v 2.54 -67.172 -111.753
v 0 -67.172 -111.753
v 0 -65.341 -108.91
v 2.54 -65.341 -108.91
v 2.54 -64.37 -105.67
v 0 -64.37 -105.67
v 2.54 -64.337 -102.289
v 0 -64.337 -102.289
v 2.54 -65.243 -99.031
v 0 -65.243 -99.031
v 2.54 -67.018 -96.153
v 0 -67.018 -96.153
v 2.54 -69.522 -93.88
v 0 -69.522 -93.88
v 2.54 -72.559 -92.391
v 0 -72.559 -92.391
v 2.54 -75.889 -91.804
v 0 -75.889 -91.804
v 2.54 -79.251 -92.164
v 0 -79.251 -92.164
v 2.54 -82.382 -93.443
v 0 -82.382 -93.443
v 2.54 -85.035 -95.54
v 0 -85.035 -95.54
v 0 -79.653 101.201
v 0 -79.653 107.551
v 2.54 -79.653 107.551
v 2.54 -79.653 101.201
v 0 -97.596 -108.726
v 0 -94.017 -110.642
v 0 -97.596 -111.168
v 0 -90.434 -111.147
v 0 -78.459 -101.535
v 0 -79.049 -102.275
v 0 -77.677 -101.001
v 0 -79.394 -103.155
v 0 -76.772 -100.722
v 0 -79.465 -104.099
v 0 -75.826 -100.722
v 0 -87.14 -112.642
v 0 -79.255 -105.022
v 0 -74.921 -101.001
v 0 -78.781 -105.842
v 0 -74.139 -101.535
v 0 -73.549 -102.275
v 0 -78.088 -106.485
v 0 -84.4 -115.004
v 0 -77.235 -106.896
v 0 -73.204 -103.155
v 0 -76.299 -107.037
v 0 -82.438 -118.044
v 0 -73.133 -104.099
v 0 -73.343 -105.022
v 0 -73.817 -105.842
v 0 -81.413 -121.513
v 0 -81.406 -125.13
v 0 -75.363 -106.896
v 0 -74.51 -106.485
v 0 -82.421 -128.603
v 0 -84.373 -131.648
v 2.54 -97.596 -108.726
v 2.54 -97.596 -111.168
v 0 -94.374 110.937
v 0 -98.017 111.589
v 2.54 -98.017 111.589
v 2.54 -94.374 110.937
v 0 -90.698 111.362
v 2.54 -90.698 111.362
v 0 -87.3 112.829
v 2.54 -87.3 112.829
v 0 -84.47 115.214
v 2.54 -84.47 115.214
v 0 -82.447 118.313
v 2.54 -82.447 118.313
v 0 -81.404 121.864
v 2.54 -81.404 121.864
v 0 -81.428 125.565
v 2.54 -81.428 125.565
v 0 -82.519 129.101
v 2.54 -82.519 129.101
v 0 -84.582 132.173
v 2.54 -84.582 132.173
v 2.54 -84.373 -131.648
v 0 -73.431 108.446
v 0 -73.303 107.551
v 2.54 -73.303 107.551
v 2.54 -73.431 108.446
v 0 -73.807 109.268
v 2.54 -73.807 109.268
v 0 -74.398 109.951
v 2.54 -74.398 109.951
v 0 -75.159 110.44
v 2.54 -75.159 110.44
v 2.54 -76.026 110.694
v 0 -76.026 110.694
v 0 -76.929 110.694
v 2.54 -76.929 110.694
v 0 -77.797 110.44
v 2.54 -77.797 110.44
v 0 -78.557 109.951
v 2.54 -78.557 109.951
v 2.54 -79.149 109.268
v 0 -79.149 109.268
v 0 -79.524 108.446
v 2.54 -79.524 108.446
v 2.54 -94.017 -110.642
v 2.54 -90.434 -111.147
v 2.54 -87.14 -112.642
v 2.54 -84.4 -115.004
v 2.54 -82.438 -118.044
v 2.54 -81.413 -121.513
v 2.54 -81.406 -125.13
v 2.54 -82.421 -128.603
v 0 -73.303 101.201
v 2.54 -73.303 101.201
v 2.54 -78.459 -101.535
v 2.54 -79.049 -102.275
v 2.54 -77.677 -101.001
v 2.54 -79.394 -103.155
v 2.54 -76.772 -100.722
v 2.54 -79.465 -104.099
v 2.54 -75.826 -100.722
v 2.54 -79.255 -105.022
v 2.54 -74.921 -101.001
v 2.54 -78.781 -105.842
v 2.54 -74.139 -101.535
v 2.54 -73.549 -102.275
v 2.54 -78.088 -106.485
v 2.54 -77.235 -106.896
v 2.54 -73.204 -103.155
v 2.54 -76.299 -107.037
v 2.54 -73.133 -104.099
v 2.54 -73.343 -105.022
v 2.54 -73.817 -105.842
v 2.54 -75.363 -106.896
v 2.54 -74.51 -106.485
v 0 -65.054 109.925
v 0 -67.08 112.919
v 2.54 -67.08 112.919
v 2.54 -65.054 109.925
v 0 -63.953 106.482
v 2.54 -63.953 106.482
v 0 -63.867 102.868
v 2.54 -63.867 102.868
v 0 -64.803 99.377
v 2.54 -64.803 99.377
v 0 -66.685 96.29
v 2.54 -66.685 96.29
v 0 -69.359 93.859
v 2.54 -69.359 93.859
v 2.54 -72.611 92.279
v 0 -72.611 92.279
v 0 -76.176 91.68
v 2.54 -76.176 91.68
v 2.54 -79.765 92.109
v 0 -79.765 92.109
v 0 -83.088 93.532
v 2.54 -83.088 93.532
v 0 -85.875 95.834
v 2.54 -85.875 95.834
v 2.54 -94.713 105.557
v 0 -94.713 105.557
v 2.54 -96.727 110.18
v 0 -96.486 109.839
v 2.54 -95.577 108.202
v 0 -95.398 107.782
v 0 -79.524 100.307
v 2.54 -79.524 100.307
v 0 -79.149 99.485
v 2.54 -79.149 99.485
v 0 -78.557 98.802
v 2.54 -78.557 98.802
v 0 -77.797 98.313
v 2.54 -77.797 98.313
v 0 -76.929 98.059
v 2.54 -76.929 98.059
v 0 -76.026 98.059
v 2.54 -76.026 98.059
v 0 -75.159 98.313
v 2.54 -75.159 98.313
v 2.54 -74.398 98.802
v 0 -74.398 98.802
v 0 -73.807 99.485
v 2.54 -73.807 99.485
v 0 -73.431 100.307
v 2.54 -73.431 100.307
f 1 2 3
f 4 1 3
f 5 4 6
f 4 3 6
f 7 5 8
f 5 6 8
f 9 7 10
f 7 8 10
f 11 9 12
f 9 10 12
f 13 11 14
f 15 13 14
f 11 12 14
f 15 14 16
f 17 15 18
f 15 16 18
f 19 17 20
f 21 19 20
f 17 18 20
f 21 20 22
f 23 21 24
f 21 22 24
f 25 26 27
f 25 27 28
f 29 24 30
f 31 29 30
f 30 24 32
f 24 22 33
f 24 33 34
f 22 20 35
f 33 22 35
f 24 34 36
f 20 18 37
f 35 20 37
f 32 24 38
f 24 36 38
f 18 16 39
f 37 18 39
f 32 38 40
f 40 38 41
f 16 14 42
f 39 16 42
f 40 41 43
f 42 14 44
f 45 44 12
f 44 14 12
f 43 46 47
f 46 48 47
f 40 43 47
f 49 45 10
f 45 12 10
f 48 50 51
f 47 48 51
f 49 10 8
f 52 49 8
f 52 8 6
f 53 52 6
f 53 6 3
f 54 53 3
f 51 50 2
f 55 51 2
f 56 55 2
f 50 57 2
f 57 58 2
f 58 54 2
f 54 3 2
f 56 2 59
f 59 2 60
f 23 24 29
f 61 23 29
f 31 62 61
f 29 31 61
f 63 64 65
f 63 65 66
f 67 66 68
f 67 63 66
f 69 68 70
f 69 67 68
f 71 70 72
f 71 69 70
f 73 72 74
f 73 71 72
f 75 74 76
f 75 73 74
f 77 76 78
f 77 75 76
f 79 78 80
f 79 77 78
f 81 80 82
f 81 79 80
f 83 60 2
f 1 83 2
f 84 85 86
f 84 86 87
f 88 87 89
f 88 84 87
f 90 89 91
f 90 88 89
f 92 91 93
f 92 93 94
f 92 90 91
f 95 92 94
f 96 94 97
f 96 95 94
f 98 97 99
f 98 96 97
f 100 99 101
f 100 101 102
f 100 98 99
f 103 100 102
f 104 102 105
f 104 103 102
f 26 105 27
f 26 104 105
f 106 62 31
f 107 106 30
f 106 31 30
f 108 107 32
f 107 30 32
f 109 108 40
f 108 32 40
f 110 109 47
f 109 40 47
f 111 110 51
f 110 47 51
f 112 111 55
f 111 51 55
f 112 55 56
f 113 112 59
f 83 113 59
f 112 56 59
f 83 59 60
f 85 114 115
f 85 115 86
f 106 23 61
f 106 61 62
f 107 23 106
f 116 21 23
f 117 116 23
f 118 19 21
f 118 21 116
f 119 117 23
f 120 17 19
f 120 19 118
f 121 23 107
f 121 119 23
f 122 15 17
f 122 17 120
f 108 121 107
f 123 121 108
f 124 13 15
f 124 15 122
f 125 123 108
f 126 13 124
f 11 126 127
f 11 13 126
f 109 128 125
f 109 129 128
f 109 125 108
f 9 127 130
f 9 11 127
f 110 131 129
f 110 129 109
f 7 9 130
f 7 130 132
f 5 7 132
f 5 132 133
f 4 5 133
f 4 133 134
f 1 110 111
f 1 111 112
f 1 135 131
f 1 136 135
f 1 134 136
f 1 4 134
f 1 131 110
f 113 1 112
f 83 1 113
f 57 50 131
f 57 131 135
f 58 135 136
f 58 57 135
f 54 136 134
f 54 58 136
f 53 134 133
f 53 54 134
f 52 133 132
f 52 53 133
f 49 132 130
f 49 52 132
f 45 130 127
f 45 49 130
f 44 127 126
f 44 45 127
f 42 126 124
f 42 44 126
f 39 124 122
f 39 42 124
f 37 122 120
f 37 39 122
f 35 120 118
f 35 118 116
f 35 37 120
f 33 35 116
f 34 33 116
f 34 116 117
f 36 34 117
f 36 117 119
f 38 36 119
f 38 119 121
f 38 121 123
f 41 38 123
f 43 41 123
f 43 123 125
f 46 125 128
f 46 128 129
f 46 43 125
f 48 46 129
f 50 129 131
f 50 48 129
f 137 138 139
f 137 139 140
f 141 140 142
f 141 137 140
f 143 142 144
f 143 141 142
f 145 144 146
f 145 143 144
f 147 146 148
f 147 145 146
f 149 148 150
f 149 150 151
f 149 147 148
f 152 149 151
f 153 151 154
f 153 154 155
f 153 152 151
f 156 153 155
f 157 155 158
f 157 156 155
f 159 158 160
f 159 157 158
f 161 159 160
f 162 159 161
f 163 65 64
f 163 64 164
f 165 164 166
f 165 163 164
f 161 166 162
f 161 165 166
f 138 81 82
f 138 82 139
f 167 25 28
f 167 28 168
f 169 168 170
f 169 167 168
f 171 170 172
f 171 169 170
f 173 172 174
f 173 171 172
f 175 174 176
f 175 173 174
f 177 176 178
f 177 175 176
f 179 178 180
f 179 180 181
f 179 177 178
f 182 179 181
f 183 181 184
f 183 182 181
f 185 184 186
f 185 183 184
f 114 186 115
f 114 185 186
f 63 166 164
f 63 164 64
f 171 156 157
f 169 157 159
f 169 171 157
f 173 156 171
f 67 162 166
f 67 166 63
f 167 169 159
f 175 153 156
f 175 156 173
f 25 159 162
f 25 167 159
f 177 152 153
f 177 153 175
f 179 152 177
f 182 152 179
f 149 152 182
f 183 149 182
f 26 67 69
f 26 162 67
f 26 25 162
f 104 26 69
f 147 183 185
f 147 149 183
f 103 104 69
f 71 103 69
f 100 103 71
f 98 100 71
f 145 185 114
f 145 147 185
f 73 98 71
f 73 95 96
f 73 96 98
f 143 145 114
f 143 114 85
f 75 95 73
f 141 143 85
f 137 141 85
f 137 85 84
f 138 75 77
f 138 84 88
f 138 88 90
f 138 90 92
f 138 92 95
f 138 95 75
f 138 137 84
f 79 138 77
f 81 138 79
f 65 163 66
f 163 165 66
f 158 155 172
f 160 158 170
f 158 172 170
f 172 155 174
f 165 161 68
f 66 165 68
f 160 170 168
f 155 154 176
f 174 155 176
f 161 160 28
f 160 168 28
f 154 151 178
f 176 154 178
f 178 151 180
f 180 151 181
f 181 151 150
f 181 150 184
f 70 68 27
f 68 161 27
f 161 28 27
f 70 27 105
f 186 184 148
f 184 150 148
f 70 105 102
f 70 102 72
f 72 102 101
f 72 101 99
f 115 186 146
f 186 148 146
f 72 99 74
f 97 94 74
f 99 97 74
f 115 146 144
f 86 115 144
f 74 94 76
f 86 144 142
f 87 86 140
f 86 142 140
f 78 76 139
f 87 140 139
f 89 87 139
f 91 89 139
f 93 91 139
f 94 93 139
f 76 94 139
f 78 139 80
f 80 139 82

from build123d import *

# Parameters (mm, degrees)
BOSS_EXTRUDE1_DEPTH   = 2.54
SKETCH1_R             = 3.175
BOSS_EXTRUDE1_2_DEPTH = 2.54
CUT_EXTRUDE1_DEPTH    = 10
CUT_EXTRUDE2_DEPTH    = 10


with BuildPart() as part:
    # Sketch1 → Boss-Extrude1 (new body)
    with BuildSketch(Plane(origin=(0, 0, 0), x_dir=(0, 0, -1), z_dir=(1, 0, 0))):
        with BuildLine():
            Line((-132.173225325, -84.582396488), (-112.918972687, -67.080031215))
            ThreePointArc((-112.918972687, -67.080031215), (-94.978825746, -67.935091298), (-95.833885829, -85.875238239))
            Line((-95.833885829, -85.875238239), (-115.088138468, -103.377603512))
            ThreePointArc((-115.088138468, -103.377603512), (-114.233078385, -85.437456571), (-132.173225325, -84.582396488))
        make_face()
        with BuildLine():
            ThreePointArc((-107.551429258, -73.302634727), (-110.726429258, -76.477634727), (-107.551429258, -79.652634727))
            Line((-107.551429258, -79.652634727), (-101.201429258, -79.652634727))
            ThreePointArc((-101.201429258, -79.652634727), (-98.026429258, -76.477634727), (-101.201429258, -73.302634727))
            Line((-101.201429258, -73.302634727), (-107.551429258, -73.302634727))
        make_face(mode=Mode.SUBTRACT)
    extrude(amount=BOSS_EXTRUDE1_DEPTH)

    # Sketch5 → Cut-Extrude2 (cut)
    with BuildSketch(Plane(origin=(2.54, 0, 0), x_dir=(0, 0, -1), z_dir=(1, 0, 0))):
        with BuildLine():
            Line((-111.589308689, -98.016747612), (-113.403096994, -101.509044233))
            add(Edge.make_bspline(
                [(-111.589308689, -98.016747612), (-96.861818153, -81.266928915), (-67.096203504, -98.64520207), (-77.198124577, -118.095600298), (-87.300045651, -137.545998525), (-118.635496441, -123.190312645), (-113.403096994, -101.509044233)],
                knots=[0, 0, 0, 0, 0.5, 0.5, 0.5, 1, 1, 1, 1], degree=3, weights=[1, 0.385133254, 0.385133254, 1, 0.385133254, 0.385133254, 1]))
        make_face()
    extrude(amount=-CUT_EXTRUDE2_DEPTH, mode=Mode.SUBTRACT)


with BuildPart() as body_2:
    # Sketch1 → Boss-Extrude1 2 (new body)
    with BuildSketch(Plane(origin=(0, 0, 0), x_dir=(0, 0, -1), z_dir=(1, 0, 0))):
        with BuildLine():
            Line((95.540074367, -85.034535944), (114.582474398, -103.175308774))
            ThreePointArc((114.582474398, -103.175308774), (113.938329585, -85.444576189), (131.648348491, -84.372647625))
            Line((131.648348491, -84.372647625), (111.752654756, -67.172007853))
            ThreePointArc((111.752654756, -67.172007853), (94.928136795, -68.190339989), (95.540074367, -85.034535944))
        make_face()
        with Locations((103.862003689, -76.298992609)):
            Circle(SKETCH1_R, mode=Mode.SUBTRACT)
    extrude(amount=BOSS_EXTRUDE1_2_DEPTH)

    # Sketch4 → Cut-Extrude1 (cut)
    with BuildSketch(Plane(origin=(2.54, 0, 0), x_dir=(0, 0, -1), z_dir=(1, 0, 0))):
        Polygon((111.167984165, -97.595743227), (108.627984165, -97.595743227), (102.147549377, -97.595743227), (102.147549377, -107.314158184), (125.321864193, -107.314158184), (121.698336242, -97.595743227), align=None)
    extrude(amount=-CUT_EXTRUDE1_DEPTH, mode=Mode.SUBTRACT)


with BuildPart() as body_3:
    # of the pieces the cut leaves, the one that is kept (cut_extrude2_keep)
    add(part.part.solids().sort_by_distance((0, -84.582396488, 132.173225325))[0])


solid = Compound([body_2.part, body_3.part])
